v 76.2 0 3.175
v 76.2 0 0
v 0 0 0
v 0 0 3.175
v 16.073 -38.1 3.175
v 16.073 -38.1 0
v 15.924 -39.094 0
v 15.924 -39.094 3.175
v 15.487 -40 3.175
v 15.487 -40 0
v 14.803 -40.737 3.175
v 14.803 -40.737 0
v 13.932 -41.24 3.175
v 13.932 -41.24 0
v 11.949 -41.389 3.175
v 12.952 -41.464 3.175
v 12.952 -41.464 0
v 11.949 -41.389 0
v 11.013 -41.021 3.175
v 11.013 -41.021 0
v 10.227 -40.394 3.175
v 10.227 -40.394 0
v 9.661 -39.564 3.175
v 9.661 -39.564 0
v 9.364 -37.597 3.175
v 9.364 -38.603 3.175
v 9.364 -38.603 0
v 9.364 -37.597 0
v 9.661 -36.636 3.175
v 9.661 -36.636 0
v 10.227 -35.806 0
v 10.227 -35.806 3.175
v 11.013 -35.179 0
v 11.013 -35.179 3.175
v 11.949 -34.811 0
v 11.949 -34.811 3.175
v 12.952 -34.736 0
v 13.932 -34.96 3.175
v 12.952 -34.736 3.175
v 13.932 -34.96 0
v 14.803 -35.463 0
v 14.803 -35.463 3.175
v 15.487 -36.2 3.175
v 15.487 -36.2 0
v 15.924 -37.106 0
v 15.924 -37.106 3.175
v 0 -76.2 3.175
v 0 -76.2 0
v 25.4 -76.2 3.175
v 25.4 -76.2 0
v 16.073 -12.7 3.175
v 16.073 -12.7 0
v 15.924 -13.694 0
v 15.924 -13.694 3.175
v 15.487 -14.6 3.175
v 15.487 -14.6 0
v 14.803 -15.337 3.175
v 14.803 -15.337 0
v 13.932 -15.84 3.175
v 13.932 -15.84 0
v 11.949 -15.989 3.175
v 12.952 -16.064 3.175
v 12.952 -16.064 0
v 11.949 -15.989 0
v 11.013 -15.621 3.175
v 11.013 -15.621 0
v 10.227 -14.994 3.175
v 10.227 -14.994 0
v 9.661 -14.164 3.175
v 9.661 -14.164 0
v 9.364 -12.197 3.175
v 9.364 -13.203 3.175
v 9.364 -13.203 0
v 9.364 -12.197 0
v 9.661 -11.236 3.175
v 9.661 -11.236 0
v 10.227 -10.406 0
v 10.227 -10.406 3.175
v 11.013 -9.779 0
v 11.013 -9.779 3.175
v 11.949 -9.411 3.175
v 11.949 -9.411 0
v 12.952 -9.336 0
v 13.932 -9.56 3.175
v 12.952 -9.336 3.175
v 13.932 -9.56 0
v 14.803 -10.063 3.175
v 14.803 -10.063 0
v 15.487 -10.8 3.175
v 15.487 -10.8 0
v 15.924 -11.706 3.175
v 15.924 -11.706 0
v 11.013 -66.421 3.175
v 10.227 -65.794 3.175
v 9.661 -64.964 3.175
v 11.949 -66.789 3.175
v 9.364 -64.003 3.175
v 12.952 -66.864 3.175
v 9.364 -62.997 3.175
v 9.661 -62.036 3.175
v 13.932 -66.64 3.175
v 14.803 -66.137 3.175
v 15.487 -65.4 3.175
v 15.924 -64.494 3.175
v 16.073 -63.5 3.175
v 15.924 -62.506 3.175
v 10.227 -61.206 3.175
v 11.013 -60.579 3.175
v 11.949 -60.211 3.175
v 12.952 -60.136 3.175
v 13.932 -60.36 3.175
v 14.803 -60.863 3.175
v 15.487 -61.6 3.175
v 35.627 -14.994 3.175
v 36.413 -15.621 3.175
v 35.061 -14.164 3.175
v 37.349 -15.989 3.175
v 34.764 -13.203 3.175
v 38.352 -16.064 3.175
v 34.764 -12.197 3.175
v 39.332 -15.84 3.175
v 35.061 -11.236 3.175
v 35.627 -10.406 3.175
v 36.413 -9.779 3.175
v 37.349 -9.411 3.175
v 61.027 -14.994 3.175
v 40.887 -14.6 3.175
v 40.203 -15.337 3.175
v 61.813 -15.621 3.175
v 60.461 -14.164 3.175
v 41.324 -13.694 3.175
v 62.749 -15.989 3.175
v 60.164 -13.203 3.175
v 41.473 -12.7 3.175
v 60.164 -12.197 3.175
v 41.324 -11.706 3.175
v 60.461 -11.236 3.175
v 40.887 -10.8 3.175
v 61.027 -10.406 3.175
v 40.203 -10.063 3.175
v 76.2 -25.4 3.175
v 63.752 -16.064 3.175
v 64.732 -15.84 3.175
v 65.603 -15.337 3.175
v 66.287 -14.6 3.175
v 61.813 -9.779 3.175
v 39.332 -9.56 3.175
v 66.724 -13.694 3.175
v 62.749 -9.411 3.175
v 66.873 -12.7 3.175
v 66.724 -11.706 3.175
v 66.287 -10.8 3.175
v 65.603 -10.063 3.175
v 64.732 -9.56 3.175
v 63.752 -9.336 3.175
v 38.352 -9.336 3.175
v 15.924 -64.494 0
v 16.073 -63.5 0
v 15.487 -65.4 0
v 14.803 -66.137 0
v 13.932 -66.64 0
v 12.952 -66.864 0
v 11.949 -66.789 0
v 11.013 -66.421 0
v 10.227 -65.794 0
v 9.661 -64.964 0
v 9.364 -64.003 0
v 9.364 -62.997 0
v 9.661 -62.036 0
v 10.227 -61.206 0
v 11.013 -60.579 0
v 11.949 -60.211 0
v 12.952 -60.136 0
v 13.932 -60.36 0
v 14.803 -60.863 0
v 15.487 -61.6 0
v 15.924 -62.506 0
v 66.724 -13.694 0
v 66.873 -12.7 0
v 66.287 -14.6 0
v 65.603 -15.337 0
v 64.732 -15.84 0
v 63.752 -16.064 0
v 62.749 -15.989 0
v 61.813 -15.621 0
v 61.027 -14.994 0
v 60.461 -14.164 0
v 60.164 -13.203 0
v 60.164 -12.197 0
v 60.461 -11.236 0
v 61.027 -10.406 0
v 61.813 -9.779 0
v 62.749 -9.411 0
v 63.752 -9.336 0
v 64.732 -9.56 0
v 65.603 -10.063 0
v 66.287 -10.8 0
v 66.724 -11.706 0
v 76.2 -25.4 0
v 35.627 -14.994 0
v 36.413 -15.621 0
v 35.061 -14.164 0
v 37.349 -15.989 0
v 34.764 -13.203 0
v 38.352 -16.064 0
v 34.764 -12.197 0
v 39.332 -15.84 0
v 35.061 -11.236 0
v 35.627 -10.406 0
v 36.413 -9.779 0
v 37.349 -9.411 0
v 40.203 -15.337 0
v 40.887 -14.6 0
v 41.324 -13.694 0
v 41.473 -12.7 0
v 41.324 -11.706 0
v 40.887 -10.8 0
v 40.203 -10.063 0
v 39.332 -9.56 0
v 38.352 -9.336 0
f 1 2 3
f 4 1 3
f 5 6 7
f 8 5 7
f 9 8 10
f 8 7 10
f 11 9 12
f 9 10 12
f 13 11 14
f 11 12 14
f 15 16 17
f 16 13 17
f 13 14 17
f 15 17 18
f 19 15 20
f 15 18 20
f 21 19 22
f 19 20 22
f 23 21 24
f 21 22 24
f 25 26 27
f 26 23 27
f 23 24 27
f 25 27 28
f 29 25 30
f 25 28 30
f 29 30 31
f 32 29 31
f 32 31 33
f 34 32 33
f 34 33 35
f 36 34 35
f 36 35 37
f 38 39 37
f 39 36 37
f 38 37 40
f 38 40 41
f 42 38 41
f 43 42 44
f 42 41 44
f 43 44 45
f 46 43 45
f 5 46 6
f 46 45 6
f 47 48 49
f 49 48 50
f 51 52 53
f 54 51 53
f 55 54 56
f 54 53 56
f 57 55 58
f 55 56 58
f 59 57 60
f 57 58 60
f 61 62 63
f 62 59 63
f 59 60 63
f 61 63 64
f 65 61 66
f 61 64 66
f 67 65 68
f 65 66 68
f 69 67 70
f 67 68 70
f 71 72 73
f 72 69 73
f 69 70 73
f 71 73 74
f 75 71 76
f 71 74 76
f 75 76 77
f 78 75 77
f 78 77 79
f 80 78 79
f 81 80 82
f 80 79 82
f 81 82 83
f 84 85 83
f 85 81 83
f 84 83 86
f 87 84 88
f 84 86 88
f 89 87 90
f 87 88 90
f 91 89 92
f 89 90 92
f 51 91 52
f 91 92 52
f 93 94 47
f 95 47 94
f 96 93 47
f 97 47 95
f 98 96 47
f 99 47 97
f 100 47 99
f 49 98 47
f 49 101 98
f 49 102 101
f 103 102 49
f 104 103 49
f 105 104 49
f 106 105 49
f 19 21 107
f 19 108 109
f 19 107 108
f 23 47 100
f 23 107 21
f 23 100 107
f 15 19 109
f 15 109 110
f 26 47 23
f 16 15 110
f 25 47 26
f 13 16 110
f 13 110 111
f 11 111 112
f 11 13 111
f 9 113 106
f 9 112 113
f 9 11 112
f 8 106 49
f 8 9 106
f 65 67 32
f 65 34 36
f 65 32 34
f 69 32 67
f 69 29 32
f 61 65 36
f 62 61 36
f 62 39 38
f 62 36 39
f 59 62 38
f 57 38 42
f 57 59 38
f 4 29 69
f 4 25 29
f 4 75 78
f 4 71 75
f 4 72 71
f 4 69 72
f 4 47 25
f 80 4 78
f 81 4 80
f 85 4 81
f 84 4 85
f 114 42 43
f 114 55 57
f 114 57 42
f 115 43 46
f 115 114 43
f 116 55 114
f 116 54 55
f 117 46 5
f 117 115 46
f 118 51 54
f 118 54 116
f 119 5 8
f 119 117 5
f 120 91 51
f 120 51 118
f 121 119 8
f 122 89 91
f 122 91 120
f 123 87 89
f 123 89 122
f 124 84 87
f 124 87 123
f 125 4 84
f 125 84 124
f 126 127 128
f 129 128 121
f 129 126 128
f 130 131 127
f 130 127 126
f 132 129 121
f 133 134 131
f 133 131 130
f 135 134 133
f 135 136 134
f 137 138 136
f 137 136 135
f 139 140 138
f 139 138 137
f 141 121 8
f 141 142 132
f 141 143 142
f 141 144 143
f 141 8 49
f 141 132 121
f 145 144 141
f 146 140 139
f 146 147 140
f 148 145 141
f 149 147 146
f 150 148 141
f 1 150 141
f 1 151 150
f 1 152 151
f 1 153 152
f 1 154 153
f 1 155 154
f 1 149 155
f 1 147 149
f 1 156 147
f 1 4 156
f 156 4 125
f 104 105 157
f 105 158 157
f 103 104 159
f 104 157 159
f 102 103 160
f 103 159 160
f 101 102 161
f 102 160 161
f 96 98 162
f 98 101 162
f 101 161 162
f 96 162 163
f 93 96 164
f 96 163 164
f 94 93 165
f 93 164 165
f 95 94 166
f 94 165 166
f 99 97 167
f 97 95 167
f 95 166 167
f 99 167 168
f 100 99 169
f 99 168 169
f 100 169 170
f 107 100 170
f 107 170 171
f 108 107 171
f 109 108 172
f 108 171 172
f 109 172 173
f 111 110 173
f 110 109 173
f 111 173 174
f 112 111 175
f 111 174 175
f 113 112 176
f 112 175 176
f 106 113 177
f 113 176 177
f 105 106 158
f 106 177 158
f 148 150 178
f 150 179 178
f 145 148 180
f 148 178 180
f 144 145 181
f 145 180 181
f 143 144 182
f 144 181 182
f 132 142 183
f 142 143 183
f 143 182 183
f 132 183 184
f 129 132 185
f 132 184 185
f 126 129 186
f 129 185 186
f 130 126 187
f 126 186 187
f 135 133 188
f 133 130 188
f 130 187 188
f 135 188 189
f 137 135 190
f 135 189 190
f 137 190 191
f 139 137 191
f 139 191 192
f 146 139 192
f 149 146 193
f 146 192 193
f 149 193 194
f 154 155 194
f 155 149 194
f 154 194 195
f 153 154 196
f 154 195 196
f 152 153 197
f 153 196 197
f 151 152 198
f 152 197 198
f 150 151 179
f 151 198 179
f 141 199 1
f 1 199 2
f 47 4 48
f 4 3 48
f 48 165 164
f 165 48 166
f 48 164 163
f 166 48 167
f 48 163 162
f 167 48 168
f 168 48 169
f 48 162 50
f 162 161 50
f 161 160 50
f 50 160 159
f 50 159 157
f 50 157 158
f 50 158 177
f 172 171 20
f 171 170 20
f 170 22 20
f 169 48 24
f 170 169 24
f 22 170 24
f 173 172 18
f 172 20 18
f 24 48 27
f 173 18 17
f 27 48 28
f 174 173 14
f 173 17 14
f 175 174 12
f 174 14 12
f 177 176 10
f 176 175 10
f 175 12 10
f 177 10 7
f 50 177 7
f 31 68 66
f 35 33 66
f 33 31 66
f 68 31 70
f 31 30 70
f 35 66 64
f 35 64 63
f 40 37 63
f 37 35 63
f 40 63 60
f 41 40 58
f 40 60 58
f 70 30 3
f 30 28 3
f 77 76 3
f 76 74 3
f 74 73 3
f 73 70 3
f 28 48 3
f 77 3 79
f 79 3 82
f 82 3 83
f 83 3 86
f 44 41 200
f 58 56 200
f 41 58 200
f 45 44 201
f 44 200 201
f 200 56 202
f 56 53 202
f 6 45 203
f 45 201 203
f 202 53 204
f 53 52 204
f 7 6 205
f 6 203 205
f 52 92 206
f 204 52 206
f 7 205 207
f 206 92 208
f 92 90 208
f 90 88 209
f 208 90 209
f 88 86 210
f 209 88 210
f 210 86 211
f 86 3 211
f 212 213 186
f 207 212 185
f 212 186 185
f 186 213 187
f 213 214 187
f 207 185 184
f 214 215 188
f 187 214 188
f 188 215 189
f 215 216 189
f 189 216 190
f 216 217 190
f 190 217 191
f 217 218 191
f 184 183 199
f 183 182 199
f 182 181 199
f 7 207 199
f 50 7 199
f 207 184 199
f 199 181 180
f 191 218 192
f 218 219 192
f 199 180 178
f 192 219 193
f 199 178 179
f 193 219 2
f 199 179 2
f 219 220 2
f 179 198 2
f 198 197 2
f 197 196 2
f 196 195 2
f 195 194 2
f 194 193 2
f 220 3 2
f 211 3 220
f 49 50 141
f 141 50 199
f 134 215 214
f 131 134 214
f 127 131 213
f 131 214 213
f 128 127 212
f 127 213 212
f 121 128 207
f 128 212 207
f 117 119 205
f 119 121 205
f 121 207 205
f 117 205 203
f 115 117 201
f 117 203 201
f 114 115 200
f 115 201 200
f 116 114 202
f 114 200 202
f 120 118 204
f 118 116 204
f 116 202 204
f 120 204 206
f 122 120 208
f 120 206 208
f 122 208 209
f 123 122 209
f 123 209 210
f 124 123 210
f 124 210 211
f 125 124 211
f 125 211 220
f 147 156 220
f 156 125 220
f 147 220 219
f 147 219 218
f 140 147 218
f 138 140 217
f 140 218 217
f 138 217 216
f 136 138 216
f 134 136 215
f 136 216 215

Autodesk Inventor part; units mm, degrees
ref_plane "YZ Plane" through (0, 0, 0) normal (1, 0, 0) x (0, 1, 0)
ref_plane "XZ Plane" through (0, 0, 0) normal (0, 1, 0) x (-1, 0, 0)
ref_plane "XY Plane" through (0, 0, 0) normal (0, 0, 1) x (1, 0, 0)
sketch "Sketch1" plane through (0, 0, 0) normal (0, 0, 1) x (1, 0, 0)
  line L0 (0, 0) -> (0, -76.2)
  line L1 (0, -76.2) -> (25.4, -76.2)
  line L2 (25.4, -76.2) -> (76.2, -25.4)
  line L3 (76.2, -25.4) -> (76.2, 0)
  line L4 (76.2, 0) -> (0, 0)
  line L5 (12.7, -76.2) -> (12.7, 0) construction
  line L6 (0, -12.7) -> (76.2, -12.7) construction
  circle A0 centre (12.7, -12.7) radius 3.3734
  circle A1 centre (12.7, -38.1) radius 3.3734
  circle A2 centre (12.7, -63.5) radius 3.3734
  circle A3 centre (38.1, -12.7) radius 3.3734
  circle A4 centre (63.5, -12.7) radius 3.3734
  dimension "d0" = 76.2
  dimension "d1" = 25.4
  dimension "d2" = 12.7
  dimension "d3" = 6.7469
  dimension "d4" = 6.7469
  dimension "d5" = 6.7469
  dimension "d6" = 6.7469
  dimension "d7" = 6.7469
  dimension "d8" = 63.5
  dimension "d9" = 25.4
  dimension "d10" = 25.4
  dimension "d11" = 25.4
extrude "Extrusion1" add sketch "Sketch1" along normal blind 3.175
properties part number "gusset"
